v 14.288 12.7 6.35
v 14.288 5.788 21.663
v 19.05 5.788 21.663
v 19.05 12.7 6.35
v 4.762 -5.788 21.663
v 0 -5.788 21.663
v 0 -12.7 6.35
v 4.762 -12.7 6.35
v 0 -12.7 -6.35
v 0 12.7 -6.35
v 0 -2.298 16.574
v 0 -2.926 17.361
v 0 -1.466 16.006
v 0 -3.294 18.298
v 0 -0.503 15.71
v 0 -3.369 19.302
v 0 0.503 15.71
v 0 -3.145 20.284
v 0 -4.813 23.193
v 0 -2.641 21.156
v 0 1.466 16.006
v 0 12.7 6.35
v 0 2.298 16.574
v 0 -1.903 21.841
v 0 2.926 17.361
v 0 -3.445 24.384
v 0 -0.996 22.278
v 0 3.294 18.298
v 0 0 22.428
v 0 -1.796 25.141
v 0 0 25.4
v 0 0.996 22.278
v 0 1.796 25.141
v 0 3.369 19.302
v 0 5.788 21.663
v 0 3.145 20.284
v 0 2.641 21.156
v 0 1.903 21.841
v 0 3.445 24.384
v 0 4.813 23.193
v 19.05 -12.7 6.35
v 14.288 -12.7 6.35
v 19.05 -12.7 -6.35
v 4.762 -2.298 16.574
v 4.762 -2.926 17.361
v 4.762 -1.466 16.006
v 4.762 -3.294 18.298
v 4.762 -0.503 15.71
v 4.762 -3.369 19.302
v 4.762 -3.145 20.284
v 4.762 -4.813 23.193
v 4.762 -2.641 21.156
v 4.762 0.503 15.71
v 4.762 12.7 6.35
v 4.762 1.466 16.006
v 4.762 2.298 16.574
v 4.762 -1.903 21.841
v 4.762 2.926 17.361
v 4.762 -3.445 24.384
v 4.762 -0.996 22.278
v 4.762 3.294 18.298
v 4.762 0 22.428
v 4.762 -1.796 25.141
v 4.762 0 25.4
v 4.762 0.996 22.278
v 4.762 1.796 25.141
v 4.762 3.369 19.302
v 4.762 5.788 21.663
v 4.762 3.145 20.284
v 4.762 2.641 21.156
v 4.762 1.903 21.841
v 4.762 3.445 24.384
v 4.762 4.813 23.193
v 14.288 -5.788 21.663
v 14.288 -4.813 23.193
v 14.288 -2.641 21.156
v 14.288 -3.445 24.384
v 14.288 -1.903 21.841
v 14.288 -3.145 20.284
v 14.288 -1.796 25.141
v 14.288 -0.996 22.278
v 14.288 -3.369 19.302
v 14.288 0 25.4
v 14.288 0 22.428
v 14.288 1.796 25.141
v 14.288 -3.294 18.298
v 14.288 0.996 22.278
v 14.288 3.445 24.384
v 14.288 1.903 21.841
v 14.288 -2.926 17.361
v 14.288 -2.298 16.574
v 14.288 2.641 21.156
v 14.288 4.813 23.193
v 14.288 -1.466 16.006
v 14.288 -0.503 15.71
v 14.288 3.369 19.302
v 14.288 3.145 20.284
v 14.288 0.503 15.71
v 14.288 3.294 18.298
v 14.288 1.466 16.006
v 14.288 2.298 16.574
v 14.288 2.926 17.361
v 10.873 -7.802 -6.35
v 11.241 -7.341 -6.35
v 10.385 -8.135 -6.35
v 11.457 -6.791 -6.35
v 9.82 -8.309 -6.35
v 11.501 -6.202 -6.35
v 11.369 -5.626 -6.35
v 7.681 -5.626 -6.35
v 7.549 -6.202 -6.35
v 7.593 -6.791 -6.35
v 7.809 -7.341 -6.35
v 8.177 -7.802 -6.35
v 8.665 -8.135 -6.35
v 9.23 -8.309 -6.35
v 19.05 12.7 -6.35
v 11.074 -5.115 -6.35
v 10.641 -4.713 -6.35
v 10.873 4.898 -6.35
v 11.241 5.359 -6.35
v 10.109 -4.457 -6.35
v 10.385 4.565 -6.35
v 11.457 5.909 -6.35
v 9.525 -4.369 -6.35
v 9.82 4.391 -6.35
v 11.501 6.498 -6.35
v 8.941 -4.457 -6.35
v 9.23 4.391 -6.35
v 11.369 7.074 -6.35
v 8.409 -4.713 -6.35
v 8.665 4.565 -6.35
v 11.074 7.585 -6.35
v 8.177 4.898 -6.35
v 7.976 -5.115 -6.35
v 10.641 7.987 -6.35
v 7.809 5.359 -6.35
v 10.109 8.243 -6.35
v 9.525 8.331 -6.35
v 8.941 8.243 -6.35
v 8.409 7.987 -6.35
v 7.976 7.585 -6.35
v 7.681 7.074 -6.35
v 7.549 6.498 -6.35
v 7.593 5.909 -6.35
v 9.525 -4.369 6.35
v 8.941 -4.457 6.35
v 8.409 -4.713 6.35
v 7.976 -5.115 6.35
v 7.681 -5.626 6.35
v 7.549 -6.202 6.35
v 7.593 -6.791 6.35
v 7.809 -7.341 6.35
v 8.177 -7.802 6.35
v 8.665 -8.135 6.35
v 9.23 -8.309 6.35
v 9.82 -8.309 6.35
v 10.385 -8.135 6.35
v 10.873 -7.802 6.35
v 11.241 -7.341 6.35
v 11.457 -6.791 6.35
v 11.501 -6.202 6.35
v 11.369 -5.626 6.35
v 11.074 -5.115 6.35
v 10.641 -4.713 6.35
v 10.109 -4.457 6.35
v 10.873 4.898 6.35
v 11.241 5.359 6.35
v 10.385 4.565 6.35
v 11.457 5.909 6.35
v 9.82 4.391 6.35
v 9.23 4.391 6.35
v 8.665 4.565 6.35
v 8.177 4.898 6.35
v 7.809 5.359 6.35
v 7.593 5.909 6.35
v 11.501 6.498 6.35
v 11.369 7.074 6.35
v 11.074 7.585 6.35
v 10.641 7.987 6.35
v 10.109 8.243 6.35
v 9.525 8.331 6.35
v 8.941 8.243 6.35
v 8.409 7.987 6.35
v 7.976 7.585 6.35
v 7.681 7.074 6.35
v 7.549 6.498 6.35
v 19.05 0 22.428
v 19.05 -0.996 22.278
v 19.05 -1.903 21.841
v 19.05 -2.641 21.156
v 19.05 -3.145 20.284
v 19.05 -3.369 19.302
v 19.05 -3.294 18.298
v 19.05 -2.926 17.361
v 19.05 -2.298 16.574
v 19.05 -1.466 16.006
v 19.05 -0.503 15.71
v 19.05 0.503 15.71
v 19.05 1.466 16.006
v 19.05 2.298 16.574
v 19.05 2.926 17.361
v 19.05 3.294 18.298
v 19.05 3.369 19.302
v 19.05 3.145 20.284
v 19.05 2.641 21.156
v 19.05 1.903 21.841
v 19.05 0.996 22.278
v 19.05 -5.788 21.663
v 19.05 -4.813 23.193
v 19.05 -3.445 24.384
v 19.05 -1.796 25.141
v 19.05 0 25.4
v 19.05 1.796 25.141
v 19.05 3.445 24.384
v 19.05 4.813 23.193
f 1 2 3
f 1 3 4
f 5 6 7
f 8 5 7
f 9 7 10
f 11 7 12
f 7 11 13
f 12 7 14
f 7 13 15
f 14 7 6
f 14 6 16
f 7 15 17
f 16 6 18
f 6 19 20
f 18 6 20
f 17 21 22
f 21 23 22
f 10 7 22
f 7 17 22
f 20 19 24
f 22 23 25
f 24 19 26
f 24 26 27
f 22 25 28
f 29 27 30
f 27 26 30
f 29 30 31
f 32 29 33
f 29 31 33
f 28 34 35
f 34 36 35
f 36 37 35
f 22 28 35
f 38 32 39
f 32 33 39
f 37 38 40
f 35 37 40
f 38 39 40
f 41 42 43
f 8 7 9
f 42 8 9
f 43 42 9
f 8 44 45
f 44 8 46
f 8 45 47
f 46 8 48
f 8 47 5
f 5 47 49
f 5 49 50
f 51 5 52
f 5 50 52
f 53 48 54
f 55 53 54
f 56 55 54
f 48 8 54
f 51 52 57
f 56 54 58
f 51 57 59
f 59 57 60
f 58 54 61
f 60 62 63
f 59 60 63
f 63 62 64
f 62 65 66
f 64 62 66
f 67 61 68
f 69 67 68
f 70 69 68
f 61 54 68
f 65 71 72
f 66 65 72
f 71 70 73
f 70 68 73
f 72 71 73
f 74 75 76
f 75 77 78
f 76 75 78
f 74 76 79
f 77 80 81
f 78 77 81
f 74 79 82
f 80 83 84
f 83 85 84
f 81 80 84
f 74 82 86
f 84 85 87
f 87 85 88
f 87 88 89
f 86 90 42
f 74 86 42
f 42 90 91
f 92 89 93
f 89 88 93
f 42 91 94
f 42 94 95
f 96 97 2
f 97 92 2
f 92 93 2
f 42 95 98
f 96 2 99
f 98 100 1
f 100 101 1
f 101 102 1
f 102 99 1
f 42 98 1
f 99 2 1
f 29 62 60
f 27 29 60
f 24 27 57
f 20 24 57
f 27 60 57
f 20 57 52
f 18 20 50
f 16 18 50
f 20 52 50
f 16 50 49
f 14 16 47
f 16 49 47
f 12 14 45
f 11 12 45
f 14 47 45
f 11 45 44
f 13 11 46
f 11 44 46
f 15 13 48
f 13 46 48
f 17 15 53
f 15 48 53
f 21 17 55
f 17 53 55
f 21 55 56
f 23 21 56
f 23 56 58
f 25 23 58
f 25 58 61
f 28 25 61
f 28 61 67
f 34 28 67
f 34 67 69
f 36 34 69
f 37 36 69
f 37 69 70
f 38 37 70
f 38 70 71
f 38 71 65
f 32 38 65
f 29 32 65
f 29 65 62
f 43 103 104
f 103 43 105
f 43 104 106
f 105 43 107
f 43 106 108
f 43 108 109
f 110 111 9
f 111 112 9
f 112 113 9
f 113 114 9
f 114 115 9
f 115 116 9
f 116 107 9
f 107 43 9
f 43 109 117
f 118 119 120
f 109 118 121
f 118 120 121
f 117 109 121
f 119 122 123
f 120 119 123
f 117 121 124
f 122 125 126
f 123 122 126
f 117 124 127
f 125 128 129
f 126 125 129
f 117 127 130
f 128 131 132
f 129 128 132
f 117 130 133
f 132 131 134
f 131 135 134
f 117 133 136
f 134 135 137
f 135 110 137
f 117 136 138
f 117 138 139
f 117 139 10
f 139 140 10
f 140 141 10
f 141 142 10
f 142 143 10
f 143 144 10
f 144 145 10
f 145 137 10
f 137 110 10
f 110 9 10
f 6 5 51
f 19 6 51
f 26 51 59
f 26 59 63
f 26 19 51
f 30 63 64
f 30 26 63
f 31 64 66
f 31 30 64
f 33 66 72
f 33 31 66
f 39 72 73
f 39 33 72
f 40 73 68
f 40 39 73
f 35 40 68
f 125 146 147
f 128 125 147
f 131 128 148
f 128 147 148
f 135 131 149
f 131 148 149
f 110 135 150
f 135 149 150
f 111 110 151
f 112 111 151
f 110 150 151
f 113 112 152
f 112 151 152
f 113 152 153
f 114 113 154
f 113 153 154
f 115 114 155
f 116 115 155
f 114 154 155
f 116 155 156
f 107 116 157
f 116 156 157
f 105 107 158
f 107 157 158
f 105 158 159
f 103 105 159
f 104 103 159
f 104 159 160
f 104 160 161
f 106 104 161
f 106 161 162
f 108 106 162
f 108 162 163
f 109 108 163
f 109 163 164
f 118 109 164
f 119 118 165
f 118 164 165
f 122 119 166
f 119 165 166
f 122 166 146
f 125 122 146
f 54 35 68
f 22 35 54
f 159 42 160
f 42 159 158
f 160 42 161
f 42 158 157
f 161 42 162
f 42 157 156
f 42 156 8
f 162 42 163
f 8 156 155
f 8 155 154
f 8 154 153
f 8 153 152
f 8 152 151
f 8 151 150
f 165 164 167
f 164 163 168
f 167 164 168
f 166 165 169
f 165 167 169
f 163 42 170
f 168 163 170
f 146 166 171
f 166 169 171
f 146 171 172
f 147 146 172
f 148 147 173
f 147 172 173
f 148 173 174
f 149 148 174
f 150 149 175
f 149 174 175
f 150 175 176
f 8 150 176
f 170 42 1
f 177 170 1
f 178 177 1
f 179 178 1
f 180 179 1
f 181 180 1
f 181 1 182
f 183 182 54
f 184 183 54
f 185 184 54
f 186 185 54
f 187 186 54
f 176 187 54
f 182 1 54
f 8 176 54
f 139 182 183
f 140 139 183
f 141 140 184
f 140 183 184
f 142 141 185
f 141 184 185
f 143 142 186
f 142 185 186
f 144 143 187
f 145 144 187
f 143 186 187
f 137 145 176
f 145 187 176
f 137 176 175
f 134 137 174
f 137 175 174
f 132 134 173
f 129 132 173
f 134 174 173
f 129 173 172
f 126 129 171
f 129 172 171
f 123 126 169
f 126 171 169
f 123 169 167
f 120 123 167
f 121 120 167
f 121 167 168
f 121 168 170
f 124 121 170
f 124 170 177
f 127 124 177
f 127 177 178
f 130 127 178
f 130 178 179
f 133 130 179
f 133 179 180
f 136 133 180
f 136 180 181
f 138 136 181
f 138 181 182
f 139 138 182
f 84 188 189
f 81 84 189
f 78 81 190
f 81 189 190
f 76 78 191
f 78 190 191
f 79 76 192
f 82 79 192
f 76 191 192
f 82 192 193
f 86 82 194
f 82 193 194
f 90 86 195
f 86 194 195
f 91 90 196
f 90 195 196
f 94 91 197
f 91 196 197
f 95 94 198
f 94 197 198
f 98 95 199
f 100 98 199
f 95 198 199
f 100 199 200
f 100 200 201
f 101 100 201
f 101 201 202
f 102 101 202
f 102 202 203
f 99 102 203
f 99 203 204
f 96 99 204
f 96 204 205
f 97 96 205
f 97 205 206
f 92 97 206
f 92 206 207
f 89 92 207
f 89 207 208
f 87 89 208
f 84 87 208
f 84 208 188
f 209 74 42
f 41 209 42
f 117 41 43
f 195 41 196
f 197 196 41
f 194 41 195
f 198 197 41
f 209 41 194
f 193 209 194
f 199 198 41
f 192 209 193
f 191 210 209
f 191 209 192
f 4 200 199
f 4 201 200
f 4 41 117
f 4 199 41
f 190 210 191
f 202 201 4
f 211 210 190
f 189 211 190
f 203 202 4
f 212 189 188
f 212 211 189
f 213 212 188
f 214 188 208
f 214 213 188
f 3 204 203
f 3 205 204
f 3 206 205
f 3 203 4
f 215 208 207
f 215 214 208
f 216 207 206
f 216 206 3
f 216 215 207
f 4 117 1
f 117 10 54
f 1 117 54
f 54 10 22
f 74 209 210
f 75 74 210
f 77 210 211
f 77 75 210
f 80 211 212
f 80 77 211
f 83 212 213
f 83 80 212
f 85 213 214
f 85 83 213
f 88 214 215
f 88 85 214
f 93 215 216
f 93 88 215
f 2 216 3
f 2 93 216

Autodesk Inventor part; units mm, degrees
ref_plane "YZ Plane" through (0, 0, 0) normal (1, 0, 0) x (0, 1, 0)
ref_plane "XZ Plane" through (0, 0, 0) normal (0, 1, 0) x (-1, 0, 0)
ref_plane "XY Plane" through (0, 0, 0) normal (0, 0, 1) x (1, 0, 0)
sketch "Sketch1" plane through (0, 0, 0) normal (1, 0, 0) x (0, 1, 0)
  line L0 (12.7, 6.35) -> (-12.7, 6.35) construction
  line L1 (-12.7, 6.35) -> (-12.7, -6.35)
  line L2 (-12.7, -6.35) -> (12.7, -6.35)
  line L3 (12.7, -6.35) -> (12.7, 6.35)
  line L4 (12.7, 6.35) -> (-12.7, -6.35) construction
  line L5 (-12.7, 6.35) -> (12.7, -6.35) construction
  circle A0 centre (0, 19.05) radius 6.35 construction
  line L6 (5.7876, 21.6626) -> (12.7, 6.35)
  line L7 (-5.7876, 21.6626) -> (-12.7, 6.35)
  arc A1 (5.7876, 21.6626) -> (-5.7876, 21.6626) centre (0, 19.05) ccw
  point P0 (0, 0)
  point P1 (0, 6.35)
  dimension "d0" = 25.4
  dimension "d1" = 12.7
  dimension "d2" = 12.7
  dimension "d3" = 12.7
extrude "Extrusion1" add sketch "Sketch1" along normal blind 19.05
hole "Hole1" at (0, 0, 19.05) direction (1, 0, 0) diameter 6.7564 end through all clearance for "Flat Head Machine Screw (82)" size "1/4" standard "Ansi Unified Screw Threads"
sketch "Sketch2" plane through (0, -12.7, -6.35) normal (0, 0, -1) x (-1, 0, 0)
  line L0 (0, 25.4) -> (-19.05, 25.4) construction
  line L1 (0, 0) -> (-19.05, 0) construction
  line L2 (-9.525, 19.05) -> (-9.525, 6.35) construction
  line L3 (0, 0) -> (0, 25.4) construction
  point P0 (0, 12.7)
  point P1 (-9.525, 25.4)
  point P2 (-9.525, 0)
  point P3 (-9.525, 12.7)
  point P4 (0, 12.7)
  dimension "d13" = 12.7
hole "Hole2" at (9.525, 6.35, -6.35) at (9.525, -6.35, -6.35) direction (0, 0, 1) diameter 3.9624 depth 13.6144 tip angle 118 thread size "10-32 UNF" class "2B" standard "ANSI Unified Screw Threads"
sketch "Sketch3" plane through (0, 12.7, 6.35) normal (0, 1, 0) x (1, 0, 0)
  line L0 (0, -15.3126) -> (0, -15.3126) construction
  line L1 (0, -15.3126) -> (19.05, -15.3126) construction
  line L2 (19.05, -15.3126) -> (19.05, -15.3126) construction
  line L3 (0, -15.3126) -> (19.05, -15.3126) construction
  line L4 (0, 0) -> (0, -15.3126) construction
  line L5 (0, -15.3126) -> (19.05, -15.3126) construction
  line L6 (19.05, 0) -> (19.05, -15.3126) construction
  line L7 (0, 0) -> (19.05, 0) construction
  line L8 (0, 12.7) -> (0, 0) construction
  line L9 (0, 0) -> (19.05, 0) construction
  line L10 (19.05, 12.7) -> (19.05, 0) construction
  line L11 (0, 12.7) -> (19.05, 12.7) construction
  line L12 (0, -19.05) -> (19.05, -19.05) construction
  line L13 (4.7625, -19.05) -> (14.2875, -19.05)
  line L14 (14.2875, -19.05) -> (14.2875, 0)
  line L15 (14.2875, 0) -> (4.7625, 0)
  line L16 (4.7625, 0) -> (4.7625, -19.05)
  point P0 (0, 6.35)
  point P1 (9.525, -19.05)
  point P2 (9.525, -19.05)
  dimension "d21" = 9.525
  dimension "d22" = 19.05
extrude "Extrusion2" cut sketch "Sketch3" against normal through all
properties part number "EL2-026-minusfillet" material "Aluminum 6061"
